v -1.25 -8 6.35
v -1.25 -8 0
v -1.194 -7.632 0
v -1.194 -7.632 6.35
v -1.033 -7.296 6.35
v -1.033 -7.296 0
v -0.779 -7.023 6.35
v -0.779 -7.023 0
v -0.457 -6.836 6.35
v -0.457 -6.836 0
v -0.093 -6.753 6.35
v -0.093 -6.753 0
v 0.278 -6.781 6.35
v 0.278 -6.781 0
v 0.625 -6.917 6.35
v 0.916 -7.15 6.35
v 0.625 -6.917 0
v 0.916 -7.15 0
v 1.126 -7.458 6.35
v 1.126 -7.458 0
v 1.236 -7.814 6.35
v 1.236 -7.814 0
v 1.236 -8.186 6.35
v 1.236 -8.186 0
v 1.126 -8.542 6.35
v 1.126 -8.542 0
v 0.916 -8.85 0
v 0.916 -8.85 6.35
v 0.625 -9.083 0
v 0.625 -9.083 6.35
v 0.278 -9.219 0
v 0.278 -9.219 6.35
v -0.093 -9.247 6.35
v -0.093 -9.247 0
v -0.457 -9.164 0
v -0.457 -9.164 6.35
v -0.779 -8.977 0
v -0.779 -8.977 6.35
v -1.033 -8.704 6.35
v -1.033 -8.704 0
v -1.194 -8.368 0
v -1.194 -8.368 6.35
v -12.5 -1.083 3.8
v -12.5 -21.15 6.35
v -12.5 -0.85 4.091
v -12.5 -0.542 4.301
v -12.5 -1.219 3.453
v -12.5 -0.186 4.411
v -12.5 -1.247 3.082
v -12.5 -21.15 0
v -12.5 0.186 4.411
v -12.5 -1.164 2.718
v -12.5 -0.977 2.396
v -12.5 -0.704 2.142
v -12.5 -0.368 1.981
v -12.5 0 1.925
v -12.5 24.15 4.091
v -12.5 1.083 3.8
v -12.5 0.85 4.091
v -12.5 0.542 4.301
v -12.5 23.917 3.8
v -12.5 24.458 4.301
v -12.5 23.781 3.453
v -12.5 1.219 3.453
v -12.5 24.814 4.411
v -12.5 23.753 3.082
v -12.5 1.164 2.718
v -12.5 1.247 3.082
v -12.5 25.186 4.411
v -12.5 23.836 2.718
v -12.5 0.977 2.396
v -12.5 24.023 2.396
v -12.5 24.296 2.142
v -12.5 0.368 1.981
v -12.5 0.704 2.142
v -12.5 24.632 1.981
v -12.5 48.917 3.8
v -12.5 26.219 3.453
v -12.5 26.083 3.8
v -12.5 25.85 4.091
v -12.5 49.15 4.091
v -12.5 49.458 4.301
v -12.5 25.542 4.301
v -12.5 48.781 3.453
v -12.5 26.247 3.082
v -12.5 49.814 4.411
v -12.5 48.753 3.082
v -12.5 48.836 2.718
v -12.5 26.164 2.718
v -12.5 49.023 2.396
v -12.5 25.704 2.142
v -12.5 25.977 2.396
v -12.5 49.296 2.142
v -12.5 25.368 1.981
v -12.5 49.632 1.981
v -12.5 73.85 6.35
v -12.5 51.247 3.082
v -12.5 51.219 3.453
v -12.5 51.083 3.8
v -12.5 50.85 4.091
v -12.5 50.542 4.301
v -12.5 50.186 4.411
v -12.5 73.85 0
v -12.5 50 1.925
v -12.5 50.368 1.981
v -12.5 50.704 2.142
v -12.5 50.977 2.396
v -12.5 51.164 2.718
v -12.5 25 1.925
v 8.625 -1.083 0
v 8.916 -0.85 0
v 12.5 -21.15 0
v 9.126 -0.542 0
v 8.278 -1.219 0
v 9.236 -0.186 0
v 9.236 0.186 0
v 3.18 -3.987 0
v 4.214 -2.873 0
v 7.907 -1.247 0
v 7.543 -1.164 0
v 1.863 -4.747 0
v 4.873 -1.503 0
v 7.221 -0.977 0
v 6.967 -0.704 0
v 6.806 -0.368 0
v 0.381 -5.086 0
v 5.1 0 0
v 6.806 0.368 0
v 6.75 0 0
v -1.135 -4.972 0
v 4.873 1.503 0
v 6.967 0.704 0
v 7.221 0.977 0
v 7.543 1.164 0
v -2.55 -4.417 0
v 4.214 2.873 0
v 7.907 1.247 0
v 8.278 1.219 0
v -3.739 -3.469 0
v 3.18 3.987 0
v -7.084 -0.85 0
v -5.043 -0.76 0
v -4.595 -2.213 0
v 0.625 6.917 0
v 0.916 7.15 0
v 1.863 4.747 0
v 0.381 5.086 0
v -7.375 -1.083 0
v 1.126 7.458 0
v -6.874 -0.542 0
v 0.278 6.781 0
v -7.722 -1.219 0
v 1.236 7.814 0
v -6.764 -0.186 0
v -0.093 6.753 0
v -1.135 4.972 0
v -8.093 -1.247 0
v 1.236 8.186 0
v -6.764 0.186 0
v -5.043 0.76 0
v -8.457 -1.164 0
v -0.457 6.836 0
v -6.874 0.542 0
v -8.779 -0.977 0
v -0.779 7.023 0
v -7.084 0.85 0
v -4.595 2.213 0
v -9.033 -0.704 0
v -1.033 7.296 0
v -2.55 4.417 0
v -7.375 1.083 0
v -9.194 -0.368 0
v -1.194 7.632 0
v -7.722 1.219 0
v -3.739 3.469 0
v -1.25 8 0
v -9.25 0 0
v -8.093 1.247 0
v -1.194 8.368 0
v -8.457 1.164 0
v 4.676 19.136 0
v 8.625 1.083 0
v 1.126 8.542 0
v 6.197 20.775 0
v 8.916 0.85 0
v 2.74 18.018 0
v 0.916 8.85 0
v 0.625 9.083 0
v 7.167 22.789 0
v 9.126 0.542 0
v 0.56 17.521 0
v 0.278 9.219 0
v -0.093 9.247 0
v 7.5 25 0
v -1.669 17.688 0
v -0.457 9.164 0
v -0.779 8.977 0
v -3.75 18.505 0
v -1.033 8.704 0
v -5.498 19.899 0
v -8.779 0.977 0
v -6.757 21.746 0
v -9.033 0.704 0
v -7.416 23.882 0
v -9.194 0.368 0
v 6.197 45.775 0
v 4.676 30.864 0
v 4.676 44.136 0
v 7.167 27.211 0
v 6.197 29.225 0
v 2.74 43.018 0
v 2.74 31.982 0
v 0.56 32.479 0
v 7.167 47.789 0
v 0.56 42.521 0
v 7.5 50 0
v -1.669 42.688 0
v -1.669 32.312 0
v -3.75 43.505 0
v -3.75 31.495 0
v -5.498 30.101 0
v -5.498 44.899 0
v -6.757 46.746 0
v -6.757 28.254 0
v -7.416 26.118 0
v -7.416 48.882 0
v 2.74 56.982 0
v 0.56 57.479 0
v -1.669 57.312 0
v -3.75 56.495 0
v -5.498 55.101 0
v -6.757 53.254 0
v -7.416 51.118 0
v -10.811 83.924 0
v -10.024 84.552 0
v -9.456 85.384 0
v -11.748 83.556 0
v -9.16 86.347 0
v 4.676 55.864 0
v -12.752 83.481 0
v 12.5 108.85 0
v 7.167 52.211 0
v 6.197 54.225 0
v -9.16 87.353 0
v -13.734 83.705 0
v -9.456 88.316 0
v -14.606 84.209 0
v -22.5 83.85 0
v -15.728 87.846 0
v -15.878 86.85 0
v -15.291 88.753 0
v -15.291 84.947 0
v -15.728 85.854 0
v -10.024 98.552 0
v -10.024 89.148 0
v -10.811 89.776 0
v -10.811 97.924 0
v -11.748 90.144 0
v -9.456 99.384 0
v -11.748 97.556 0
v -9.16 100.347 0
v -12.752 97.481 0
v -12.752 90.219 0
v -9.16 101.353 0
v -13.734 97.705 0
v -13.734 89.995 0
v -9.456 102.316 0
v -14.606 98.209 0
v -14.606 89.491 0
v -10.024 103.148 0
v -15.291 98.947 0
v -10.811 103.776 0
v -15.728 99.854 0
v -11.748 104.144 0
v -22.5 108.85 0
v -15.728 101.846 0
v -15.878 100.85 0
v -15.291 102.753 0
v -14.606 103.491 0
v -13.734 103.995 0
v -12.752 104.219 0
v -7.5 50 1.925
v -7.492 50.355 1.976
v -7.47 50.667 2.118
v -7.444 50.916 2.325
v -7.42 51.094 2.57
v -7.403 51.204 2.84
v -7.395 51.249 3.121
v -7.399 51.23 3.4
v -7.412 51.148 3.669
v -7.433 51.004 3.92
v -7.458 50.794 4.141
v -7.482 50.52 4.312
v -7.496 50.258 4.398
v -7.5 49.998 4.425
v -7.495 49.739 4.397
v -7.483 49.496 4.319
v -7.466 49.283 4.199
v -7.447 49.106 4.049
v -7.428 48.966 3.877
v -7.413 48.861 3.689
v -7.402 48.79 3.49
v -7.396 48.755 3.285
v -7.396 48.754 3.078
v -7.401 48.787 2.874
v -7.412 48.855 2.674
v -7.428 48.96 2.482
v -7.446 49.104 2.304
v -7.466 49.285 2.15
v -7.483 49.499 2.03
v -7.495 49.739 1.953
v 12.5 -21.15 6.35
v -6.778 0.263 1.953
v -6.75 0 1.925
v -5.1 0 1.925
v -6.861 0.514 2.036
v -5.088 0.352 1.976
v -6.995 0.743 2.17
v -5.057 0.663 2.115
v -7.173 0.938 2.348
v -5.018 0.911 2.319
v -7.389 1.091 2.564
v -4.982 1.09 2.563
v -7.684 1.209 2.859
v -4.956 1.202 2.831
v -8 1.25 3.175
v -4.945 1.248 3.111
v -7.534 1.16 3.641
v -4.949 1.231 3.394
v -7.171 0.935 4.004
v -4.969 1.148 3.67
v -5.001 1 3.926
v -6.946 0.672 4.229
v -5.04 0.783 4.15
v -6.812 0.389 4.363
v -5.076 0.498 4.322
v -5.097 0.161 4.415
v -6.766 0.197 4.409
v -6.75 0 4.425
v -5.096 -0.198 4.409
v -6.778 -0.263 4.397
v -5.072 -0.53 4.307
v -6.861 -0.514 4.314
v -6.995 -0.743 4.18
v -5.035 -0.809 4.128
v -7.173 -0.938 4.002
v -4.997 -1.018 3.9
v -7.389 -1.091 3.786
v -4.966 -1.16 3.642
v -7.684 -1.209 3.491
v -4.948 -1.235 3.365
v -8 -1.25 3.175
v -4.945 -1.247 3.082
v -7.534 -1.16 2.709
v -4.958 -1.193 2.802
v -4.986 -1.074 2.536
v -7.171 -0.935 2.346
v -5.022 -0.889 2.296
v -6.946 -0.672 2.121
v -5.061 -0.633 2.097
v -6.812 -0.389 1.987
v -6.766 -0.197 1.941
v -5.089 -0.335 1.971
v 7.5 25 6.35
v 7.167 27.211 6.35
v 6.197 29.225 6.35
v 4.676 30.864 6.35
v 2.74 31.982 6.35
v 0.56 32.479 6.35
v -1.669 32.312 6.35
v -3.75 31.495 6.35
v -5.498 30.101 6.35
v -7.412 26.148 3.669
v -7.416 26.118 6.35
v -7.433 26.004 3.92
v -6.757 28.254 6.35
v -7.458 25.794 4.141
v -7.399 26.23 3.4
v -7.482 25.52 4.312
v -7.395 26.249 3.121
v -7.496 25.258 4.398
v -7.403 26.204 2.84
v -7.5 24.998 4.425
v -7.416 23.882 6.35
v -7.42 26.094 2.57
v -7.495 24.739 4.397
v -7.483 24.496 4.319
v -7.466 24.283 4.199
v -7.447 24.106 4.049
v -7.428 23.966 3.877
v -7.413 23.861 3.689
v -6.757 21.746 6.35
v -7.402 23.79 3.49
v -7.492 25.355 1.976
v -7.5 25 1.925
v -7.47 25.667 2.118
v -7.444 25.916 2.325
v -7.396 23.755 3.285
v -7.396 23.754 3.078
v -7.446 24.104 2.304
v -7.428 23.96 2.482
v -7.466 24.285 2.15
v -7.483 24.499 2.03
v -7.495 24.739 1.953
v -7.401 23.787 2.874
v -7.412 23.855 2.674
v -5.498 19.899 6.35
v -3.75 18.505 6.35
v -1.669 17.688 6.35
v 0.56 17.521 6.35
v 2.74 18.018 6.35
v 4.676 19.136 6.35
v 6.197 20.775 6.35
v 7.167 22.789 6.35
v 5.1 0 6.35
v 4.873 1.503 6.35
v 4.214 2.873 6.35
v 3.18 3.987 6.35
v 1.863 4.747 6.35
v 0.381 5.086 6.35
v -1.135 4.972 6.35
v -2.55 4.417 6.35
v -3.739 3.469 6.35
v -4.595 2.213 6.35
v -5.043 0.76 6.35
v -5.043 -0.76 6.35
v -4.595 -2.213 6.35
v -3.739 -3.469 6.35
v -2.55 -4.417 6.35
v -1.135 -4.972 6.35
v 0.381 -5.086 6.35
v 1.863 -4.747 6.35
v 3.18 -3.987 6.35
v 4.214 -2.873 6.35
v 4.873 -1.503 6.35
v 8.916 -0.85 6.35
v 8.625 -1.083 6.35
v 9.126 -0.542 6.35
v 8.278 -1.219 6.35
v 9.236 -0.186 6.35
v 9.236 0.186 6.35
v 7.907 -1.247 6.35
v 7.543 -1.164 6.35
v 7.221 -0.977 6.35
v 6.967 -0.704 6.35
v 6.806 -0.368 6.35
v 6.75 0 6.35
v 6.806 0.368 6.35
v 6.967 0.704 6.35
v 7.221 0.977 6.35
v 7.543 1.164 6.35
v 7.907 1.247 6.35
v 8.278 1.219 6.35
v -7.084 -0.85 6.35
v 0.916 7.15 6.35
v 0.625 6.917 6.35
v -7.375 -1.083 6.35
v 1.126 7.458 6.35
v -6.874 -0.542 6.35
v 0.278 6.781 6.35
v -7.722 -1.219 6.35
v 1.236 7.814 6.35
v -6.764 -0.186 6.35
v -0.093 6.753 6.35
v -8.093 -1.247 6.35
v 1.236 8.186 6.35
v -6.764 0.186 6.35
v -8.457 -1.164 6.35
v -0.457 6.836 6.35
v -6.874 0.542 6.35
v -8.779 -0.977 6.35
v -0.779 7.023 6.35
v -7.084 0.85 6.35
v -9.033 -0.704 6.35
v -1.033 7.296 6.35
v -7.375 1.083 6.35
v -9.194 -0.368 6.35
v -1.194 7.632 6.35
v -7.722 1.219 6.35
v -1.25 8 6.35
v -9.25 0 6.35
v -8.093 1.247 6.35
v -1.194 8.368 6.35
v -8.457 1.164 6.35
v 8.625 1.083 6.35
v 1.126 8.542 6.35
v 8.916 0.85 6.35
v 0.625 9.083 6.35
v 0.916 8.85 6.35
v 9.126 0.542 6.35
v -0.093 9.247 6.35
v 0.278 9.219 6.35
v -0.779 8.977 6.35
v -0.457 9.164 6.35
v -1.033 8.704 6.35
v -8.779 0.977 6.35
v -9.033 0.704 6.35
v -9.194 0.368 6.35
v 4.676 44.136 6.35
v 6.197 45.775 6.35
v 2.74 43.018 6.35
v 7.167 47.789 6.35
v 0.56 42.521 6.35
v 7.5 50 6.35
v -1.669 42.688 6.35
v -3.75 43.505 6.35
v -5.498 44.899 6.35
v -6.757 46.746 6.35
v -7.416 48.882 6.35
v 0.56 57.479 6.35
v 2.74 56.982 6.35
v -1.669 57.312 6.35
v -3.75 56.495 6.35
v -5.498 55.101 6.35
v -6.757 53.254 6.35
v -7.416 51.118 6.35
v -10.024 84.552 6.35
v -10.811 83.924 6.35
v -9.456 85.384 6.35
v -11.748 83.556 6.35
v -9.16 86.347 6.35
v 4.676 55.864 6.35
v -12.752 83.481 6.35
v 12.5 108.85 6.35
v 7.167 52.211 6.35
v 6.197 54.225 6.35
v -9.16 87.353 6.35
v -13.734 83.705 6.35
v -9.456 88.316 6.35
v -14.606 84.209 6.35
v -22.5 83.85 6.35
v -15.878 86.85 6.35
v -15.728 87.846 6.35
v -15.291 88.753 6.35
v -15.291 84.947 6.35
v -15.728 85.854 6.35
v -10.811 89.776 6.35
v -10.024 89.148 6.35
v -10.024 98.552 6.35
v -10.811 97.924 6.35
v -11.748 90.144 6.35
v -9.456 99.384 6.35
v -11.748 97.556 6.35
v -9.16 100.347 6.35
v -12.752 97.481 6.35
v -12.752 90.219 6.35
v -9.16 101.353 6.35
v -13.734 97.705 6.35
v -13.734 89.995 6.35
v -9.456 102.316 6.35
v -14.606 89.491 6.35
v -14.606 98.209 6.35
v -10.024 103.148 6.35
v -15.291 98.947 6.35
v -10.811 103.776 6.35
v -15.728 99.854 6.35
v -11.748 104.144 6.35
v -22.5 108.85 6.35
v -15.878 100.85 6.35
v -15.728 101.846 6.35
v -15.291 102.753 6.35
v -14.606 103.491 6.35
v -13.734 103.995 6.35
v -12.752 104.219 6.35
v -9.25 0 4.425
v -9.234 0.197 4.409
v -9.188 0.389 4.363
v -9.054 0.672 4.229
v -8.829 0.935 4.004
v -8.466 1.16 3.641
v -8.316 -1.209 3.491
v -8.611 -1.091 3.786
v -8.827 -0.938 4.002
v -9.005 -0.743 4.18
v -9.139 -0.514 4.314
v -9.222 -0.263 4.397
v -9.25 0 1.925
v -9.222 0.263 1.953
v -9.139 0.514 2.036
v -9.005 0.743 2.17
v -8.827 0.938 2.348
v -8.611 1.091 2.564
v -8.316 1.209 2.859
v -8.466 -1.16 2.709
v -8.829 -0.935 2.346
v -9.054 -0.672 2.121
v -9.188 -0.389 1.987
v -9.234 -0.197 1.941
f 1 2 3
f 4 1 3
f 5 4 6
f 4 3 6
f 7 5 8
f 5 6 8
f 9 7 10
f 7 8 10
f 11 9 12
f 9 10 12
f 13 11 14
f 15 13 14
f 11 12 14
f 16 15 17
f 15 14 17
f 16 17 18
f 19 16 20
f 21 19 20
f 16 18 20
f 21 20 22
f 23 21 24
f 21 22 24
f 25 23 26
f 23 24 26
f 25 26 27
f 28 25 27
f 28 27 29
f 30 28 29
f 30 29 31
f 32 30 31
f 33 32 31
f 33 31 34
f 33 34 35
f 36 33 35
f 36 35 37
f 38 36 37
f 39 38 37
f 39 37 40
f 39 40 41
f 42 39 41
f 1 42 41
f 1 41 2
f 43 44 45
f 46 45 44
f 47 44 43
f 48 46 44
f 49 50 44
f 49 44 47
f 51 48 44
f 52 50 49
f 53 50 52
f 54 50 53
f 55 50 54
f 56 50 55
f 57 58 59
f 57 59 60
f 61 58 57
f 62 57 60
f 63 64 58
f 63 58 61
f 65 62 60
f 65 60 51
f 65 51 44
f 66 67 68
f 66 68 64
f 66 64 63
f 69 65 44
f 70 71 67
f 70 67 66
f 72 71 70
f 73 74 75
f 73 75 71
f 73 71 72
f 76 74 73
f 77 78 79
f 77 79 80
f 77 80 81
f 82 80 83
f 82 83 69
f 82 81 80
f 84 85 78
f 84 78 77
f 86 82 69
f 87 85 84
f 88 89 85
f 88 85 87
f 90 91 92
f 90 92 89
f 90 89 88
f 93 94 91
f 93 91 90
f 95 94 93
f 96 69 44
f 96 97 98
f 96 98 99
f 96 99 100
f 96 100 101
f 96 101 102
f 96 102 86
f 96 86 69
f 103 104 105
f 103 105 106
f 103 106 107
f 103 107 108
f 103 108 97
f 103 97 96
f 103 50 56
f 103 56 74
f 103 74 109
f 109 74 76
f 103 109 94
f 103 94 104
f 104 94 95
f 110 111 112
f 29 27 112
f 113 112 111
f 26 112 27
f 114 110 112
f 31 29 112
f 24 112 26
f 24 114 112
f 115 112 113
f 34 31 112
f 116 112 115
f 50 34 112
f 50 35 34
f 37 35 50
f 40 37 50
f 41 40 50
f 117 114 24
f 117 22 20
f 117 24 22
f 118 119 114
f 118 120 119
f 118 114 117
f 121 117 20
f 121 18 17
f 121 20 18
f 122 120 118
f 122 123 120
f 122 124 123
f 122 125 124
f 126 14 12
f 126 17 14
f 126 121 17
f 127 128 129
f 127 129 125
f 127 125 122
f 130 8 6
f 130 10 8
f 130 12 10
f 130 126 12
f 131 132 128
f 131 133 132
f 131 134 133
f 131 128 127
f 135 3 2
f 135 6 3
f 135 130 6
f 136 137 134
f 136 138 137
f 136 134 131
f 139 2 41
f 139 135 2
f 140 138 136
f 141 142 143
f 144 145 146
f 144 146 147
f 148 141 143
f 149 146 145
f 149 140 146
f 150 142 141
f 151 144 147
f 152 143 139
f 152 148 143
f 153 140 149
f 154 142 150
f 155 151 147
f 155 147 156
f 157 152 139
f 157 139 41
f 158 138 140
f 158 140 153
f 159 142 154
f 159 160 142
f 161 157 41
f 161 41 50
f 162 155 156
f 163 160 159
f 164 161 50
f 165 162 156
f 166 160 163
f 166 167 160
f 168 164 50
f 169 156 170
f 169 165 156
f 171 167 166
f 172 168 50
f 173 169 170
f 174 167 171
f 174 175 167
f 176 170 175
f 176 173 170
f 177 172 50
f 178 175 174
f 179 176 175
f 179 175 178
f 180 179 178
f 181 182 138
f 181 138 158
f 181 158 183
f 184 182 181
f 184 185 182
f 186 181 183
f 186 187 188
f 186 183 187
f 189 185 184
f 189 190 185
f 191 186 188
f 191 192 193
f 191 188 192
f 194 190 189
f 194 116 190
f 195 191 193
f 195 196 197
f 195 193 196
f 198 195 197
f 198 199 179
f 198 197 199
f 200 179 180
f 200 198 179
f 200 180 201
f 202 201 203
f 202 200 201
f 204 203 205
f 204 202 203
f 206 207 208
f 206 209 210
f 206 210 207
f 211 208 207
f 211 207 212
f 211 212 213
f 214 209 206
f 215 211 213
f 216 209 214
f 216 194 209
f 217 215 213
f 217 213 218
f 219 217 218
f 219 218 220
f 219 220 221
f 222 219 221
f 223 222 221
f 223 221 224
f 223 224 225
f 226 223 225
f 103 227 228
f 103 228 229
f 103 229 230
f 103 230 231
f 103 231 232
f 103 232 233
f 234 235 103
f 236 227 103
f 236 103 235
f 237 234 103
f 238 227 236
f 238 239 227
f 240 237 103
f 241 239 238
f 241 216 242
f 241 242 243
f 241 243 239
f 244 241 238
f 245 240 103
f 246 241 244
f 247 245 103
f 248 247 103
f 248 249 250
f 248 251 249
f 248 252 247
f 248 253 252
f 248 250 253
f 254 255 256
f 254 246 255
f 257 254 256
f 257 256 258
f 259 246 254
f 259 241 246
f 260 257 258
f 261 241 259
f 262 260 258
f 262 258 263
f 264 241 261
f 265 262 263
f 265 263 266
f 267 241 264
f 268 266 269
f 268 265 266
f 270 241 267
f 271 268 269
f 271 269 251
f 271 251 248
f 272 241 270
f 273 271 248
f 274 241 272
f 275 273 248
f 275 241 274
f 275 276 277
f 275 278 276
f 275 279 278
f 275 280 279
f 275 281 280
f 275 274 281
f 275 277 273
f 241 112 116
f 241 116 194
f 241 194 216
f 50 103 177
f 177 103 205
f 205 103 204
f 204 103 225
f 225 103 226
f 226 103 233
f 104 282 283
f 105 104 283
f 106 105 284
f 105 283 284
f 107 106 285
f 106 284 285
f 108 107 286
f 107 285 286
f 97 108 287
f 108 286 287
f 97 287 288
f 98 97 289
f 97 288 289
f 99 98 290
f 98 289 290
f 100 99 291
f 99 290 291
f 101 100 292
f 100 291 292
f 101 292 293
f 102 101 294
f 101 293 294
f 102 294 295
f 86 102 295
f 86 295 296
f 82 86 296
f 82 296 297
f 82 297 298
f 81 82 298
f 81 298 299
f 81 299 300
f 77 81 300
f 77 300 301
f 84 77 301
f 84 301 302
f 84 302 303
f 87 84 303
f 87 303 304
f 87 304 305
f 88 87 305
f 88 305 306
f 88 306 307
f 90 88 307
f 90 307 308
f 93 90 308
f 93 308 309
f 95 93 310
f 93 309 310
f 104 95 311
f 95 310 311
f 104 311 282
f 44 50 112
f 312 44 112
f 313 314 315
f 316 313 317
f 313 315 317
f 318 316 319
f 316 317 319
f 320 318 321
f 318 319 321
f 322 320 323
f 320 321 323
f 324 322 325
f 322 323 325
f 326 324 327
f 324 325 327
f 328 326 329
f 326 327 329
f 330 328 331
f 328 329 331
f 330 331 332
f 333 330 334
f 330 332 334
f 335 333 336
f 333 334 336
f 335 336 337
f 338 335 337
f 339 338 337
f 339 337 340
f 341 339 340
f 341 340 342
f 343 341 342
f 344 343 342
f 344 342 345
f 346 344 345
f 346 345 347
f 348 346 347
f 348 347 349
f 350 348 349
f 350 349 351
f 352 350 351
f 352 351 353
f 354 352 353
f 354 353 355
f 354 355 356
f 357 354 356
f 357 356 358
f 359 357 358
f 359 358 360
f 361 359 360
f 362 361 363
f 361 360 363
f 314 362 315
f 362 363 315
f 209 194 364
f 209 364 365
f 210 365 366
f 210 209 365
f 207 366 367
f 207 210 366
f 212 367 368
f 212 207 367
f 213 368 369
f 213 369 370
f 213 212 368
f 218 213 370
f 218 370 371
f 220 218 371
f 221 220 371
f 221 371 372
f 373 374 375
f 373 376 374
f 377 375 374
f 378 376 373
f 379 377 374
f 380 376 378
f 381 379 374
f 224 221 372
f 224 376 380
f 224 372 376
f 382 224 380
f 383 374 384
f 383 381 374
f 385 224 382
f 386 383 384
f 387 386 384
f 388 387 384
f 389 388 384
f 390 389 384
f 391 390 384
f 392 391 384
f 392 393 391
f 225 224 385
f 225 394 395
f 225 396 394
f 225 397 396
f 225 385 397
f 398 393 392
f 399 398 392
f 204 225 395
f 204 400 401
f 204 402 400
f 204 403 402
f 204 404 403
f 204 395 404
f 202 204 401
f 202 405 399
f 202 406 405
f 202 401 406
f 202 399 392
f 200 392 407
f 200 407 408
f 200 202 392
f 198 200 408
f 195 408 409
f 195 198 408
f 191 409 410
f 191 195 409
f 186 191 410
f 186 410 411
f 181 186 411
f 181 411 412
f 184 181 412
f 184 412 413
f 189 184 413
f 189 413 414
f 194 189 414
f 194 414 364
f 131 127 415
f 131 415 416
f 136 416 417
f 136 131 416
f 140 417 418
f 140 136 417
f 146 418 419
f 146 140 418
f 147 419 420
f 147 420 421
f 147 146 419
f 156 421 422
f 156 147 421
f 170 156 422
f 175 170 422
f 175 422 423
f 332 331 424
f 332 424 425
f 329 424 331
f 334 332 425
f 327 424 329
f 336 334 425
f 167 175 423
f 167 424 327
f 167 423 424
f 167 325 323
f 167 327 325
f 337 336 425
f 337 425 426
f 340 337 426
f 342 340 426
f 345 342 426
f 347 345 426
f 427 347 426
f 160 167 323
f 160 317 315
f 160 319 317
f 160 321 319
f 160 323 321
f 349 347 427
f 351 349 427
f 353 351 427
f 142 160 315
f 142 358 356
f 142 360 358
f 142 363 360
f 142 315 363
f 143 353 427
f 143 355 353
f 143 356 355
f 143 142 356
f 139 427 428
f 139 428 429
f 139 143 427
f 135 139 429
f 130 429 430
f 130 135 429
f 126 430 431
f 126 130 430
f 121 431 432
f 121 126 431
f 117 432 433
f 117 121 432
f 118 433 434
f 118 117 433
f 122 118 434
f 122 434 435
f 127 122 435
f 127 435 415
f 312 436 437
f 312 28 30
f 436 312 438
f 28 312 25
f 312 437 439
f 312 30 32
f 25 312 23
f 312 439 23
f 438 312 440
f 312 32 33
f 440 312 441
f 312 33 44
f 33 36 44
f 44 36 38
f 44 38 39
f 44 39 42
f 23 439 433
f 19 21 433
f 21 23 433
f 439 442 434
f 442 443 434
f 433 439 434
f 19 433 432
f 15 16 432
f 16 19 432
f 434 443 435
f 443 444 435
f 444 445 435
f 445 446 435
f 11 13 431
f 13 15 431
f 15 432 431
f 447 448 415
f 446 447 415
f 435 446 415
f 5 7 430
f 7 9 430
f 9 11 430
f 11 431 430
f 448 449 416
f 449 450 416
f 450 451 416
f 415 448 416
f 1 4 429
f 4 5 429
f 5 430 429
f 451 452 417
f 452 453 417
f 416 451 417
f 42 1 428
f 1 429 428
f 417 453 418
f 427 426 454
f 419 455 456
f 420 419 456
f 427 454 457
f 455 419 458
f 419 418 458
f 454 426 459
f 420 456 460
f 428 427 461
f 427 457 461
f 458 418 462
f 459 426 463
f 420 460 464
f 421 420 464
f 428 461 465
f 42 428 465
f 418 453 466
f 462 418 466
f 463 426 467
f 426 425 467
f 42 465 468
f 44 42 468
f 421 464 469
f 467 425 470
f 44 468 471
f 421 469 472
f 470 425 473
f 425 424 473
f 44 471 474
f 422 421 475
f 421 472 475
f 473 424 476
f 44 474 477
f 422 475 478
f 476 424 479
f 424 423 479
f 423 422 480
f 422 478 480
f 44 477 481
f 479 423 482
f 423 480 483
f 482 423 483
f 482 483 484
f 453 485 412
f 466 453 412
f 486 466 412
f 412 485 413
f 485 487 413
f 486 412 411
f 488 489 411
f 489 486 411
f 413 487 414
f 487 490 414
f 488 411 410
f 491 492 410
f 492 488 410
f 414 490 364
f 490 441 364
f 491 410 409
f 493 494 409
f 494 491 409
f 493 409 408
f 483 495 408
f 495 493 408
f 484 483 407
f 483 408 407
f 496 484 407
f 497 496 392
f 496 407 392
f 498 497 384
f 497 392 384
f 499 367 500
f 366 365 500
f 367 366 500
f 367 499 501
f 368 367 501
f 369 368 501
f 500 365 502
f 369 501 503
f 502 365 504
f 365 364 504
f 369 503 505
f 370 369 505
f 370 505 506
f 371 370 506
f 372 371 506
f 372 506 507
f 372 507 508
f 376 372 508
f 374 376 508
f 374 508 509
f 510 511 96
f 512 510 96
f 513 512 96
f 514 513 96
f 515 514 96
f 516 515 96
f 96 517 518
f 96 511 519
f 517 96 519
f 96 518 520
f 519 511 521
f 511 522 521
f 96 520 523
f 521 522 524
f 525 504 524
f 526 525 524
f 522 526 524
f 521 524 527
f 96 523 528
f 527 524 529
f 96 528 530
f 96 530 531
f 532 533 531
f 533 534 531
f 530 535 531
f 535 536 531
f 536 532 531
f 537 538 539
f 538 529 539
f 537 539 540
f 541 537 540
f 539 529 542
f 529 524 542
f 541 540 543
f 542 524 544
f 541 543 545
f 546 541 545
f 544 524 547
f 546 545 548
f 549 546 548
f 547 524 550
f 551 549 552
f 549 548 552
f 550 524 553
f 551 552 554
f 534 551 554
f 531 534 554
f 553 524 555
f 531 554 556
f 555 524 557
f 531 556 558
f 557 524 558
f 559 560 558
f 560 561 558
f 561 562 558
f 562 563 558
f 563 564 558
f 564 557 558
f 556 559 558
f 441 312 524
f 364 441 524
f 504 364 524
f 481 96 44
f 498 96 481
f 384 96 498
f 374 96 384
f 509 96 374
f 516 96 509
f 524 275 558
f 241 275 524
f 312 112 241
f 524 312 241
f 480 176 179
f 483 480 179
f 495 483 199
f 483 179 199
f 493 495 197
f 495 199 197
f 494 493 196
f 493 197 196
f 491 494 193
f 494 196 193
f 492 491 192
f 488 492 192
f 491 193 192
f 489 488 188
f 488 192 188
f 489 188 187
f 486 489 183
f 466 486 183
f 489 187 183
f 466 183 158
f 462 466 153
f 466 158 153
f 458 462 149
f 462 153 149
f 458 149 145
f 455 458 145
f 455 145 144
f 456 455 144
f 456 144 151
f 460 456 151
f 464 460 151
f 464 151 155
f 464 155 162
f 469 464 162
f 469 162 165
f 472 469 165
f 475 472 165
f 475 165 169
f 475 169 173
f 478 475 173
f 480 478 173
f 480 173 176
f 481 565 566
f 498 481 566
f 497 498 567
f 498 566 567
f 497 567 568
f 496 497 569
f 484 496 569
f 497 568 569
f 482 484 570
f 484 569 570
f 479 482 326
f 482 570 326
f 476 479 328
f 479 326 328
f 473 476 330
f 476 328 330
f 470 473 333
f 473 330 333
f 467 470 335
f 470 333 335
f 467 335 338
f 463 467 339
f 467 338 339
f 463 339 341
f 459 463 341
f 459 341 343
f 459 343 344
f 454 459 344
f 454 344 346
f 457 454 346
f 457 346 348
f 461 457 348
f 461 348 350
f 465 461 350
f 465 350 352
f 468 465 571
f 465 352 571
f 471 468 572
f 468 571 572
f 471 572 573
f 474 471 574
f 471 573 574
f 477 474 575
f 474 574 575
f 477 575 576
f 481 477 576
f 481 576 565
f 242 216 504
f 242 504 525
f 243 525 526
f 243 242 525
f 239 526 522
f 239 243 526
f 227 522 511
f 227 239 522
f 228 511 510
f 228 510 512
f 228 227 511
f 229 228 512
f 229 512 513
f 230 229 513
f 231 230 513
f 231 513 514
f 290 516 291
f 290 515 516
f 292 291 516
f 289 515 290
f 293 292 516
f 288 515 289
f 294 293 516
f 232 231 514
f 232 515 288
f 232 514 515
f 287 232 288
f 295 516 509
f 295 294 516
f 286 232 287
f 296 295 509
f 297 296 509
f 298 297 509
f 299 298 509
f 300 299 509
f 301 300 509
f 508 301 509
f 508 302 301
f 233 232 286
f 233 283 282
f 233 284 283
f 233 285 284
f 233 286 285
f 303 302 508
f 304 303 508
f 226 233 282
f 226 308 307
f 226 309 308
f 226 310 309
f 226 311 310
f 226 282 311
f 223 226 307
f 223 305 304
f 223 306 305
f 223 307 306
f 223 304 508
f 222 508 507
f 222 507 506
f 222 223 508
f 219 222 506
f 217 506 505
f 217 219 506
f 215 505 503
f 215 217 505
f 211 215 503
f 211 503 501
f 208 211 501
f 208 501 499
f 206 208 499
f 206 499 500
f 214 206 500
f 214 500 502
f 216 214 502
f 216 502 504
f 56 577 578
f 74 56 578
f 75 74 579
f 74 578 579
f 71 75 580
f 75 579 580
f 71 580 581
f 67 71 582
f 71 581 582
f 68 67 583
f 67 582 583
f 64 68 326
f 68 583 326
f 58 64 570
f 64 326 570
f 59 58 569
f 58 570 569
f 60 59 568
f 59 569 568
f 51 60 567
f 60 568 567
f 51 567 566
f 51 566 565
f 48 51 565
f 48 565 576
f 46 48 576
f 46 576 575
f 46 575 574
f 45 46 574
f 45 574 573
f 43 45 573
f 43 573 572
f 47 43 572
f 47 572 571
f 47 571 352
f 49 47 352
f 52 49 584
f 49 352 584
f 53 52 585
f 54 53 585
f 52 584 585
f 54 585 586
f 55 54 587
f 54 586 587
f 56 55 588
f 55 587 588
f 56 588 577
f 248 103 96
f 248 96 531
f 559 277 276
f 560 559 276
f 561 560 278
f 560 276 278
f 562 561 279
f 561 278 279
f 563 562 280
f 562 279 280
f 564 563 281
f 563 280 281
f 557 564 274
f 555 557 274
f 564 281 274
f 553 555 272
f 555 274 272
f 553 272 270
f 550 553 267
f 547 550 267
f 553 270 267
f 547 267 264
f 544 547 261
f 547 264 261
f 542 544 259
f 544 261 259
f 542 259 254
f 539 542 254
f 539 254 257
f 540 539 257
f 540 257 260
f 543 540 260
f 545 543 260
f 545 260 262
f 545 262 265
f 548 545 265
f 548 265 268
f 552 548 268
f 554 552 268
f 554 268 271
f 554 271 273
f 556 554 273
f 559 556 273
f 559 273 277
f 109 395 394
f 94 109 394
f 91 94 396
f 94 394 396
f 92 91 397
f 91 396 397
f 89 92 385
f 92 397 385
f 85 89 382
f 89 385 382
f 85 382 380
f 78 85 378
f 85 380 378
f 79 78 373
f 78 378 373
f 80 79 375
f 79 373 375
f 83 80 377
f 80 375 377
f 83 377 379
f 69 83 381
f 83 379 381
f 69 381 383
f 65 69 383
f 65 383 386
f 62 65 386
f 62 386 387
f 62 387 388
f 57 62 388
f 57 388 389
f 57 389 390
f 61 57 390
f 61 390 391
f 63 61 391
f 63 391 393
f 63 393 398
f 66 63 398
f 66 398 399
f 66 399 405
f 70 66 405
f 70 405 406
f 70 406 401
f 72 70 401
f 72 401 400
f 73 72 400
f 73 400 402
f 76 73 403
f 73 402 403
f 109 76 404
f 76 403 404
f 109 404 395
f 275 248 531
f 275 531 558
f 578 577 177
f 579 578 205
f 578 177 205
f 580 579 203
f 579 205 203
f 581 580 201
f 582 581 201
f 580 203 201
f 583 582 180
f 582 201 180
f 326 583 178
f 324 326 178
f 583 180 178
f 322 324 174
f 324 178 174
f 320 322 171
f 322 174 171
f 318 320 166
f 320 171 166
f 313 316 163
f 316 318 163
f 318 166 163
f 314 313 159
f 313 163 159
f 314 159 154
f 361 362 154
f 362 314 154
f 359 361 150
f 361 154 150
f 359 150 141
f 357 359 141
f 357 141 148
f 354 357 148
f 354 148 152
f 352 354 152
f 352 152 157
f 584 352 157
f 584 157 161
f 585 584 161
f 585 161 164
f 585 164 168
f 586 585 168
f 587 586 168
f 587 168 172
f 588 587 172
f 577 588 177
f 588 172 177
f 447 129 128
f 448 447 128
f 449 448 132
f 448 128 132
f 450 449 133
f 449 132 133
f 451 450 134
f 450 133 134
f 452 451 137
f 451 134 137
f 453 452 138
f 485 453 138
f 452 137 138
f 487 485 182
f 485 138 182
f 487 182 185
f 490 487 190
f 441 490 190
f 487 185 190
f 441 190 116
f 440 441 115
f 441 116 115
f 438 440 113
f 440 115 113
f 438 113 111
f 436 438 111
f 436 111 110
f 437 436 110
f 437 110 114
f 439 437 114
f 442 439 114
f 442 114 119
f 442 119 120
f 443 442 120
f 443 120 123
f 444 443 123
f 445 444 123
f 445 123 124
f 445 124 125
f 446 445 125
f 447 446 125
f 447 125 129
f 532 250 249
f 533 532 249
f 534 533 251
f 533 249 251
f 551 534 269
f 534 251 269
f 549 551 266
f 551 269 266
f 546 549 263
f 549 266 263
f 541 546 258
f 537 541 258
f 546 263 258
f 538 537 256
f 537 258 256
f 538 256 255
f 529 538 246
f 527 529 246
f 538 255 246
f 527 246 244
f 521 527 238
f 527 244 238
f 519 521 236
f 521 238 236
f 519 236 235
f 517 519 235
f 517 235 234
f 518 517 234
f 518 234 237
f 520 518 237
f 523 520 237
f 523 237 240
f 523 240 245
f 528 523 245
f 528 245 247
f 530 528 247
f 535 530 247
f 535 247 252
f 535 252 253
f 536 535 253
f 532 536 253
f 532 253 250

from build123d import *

# Parameters (mm, degrees)
SKETCH2_W                       = 25
SKETCH2_H                       = 130
SKETCH2_R                       = 5.1
SKETCH2_R_2                     = 7.5
BOSS_EXTRUDE1_DEPTH             = 6.35
TAP_DRILL_FOR_M3X0_5_TAP1_D     = 2.5
TAP_DRILL_FOR_M3X0_5_TAP1_DEPTH = 12.5
TAP_DRILL_FOR_M3X0_5_TAP1_TIP   = 0.751075774
BOSS_EXTRUDE2_DEPTH             = 6.35
F_1_4_CLEARANCE_HOLE1_D         = 6.7564
TAP_DRILL_FOR_M3X0_5_TAP2_D     = 2.5


with BuildPart() as part:
    # Sketch2 → Boss-Extrude1 (new body)
    with BuildSketch(Plane.XY):
        with Locations((0, 43.85)):
            Rectangle(SKETCH2_W, SKETCH2_H)
        Circle(SKETCH2_R, mode=Mode.SUBTRACT)
        with Locations((0, 25)):
            Circle(SKETCH2_R_2, mode=Mode.SUBTRACT)
        with Locations((0, 50)):
            Circle(SKETCH2_R_2, mode=Mode.SUBTRACT)
    extrude(amount=BOSS_EXTRUDE1_DEPTH)

    # Tap Drill for M3x0.5 Tap1
    with Locations(Plane.ZY.offset(12.5)):
        with Locations((3.175, 50), (3.175, 0), (3.175, 25)):
            Hole(TAP_DRILL_FOR_M3X0_5_TAP1_D / 2, depth=TAP_DRILL_FOR_M3X0_5_TAP1_DEPTH)
            with Locations((0, 0, -(TAP_DRILL_FOR_M3X0_5_TAP1_DEPTH + TAP_DRILL_FOR_M3X0_5_TAP1_TIP / 2))):  # 118° drill point
                Cone(0, TAP_DRILL_FOR_M3X0_5_TAP1_D / 2, TAP_DRILL_FOR_M3X0_5_TAP1_TIP, mode=Mode.SUBTRACT)

    # Sketch8 → Boss-Extrude2 (add)
    with BuildSketch(Plane(origin=(0, 0, 0), x_dir=(-1, 0, 0), z_dir=(0, 0, -1))):
        Polygon((12.5, 73.85), (22.5, 83.85), (22.5, 108.85), (12.5, 108.85), align=None)
    extrude(amount=-BOSS_EXTRUDE2_DEPTH)

    # 1/4 Clearance Hole1 (through all)
    with Locations(Plane.XY.offset(6.35)):
        with Locations((-12.5, 86.85), (-12.5, 100.85)):
            Hole(F_1_4_CLEARANCE_HOLE1_D / 2)

    # Tap Drill for M3x0.5 Tap2 (through all)
    with Locations(Plane.XY.offset(6.35)):
        with Locations((-8, 0), (0, 8), (8, 0), (0, -8)):
            Hole(TAP_DRILL_FOR_M3X0_5_TAP2_D / 2)


solid = part.part
